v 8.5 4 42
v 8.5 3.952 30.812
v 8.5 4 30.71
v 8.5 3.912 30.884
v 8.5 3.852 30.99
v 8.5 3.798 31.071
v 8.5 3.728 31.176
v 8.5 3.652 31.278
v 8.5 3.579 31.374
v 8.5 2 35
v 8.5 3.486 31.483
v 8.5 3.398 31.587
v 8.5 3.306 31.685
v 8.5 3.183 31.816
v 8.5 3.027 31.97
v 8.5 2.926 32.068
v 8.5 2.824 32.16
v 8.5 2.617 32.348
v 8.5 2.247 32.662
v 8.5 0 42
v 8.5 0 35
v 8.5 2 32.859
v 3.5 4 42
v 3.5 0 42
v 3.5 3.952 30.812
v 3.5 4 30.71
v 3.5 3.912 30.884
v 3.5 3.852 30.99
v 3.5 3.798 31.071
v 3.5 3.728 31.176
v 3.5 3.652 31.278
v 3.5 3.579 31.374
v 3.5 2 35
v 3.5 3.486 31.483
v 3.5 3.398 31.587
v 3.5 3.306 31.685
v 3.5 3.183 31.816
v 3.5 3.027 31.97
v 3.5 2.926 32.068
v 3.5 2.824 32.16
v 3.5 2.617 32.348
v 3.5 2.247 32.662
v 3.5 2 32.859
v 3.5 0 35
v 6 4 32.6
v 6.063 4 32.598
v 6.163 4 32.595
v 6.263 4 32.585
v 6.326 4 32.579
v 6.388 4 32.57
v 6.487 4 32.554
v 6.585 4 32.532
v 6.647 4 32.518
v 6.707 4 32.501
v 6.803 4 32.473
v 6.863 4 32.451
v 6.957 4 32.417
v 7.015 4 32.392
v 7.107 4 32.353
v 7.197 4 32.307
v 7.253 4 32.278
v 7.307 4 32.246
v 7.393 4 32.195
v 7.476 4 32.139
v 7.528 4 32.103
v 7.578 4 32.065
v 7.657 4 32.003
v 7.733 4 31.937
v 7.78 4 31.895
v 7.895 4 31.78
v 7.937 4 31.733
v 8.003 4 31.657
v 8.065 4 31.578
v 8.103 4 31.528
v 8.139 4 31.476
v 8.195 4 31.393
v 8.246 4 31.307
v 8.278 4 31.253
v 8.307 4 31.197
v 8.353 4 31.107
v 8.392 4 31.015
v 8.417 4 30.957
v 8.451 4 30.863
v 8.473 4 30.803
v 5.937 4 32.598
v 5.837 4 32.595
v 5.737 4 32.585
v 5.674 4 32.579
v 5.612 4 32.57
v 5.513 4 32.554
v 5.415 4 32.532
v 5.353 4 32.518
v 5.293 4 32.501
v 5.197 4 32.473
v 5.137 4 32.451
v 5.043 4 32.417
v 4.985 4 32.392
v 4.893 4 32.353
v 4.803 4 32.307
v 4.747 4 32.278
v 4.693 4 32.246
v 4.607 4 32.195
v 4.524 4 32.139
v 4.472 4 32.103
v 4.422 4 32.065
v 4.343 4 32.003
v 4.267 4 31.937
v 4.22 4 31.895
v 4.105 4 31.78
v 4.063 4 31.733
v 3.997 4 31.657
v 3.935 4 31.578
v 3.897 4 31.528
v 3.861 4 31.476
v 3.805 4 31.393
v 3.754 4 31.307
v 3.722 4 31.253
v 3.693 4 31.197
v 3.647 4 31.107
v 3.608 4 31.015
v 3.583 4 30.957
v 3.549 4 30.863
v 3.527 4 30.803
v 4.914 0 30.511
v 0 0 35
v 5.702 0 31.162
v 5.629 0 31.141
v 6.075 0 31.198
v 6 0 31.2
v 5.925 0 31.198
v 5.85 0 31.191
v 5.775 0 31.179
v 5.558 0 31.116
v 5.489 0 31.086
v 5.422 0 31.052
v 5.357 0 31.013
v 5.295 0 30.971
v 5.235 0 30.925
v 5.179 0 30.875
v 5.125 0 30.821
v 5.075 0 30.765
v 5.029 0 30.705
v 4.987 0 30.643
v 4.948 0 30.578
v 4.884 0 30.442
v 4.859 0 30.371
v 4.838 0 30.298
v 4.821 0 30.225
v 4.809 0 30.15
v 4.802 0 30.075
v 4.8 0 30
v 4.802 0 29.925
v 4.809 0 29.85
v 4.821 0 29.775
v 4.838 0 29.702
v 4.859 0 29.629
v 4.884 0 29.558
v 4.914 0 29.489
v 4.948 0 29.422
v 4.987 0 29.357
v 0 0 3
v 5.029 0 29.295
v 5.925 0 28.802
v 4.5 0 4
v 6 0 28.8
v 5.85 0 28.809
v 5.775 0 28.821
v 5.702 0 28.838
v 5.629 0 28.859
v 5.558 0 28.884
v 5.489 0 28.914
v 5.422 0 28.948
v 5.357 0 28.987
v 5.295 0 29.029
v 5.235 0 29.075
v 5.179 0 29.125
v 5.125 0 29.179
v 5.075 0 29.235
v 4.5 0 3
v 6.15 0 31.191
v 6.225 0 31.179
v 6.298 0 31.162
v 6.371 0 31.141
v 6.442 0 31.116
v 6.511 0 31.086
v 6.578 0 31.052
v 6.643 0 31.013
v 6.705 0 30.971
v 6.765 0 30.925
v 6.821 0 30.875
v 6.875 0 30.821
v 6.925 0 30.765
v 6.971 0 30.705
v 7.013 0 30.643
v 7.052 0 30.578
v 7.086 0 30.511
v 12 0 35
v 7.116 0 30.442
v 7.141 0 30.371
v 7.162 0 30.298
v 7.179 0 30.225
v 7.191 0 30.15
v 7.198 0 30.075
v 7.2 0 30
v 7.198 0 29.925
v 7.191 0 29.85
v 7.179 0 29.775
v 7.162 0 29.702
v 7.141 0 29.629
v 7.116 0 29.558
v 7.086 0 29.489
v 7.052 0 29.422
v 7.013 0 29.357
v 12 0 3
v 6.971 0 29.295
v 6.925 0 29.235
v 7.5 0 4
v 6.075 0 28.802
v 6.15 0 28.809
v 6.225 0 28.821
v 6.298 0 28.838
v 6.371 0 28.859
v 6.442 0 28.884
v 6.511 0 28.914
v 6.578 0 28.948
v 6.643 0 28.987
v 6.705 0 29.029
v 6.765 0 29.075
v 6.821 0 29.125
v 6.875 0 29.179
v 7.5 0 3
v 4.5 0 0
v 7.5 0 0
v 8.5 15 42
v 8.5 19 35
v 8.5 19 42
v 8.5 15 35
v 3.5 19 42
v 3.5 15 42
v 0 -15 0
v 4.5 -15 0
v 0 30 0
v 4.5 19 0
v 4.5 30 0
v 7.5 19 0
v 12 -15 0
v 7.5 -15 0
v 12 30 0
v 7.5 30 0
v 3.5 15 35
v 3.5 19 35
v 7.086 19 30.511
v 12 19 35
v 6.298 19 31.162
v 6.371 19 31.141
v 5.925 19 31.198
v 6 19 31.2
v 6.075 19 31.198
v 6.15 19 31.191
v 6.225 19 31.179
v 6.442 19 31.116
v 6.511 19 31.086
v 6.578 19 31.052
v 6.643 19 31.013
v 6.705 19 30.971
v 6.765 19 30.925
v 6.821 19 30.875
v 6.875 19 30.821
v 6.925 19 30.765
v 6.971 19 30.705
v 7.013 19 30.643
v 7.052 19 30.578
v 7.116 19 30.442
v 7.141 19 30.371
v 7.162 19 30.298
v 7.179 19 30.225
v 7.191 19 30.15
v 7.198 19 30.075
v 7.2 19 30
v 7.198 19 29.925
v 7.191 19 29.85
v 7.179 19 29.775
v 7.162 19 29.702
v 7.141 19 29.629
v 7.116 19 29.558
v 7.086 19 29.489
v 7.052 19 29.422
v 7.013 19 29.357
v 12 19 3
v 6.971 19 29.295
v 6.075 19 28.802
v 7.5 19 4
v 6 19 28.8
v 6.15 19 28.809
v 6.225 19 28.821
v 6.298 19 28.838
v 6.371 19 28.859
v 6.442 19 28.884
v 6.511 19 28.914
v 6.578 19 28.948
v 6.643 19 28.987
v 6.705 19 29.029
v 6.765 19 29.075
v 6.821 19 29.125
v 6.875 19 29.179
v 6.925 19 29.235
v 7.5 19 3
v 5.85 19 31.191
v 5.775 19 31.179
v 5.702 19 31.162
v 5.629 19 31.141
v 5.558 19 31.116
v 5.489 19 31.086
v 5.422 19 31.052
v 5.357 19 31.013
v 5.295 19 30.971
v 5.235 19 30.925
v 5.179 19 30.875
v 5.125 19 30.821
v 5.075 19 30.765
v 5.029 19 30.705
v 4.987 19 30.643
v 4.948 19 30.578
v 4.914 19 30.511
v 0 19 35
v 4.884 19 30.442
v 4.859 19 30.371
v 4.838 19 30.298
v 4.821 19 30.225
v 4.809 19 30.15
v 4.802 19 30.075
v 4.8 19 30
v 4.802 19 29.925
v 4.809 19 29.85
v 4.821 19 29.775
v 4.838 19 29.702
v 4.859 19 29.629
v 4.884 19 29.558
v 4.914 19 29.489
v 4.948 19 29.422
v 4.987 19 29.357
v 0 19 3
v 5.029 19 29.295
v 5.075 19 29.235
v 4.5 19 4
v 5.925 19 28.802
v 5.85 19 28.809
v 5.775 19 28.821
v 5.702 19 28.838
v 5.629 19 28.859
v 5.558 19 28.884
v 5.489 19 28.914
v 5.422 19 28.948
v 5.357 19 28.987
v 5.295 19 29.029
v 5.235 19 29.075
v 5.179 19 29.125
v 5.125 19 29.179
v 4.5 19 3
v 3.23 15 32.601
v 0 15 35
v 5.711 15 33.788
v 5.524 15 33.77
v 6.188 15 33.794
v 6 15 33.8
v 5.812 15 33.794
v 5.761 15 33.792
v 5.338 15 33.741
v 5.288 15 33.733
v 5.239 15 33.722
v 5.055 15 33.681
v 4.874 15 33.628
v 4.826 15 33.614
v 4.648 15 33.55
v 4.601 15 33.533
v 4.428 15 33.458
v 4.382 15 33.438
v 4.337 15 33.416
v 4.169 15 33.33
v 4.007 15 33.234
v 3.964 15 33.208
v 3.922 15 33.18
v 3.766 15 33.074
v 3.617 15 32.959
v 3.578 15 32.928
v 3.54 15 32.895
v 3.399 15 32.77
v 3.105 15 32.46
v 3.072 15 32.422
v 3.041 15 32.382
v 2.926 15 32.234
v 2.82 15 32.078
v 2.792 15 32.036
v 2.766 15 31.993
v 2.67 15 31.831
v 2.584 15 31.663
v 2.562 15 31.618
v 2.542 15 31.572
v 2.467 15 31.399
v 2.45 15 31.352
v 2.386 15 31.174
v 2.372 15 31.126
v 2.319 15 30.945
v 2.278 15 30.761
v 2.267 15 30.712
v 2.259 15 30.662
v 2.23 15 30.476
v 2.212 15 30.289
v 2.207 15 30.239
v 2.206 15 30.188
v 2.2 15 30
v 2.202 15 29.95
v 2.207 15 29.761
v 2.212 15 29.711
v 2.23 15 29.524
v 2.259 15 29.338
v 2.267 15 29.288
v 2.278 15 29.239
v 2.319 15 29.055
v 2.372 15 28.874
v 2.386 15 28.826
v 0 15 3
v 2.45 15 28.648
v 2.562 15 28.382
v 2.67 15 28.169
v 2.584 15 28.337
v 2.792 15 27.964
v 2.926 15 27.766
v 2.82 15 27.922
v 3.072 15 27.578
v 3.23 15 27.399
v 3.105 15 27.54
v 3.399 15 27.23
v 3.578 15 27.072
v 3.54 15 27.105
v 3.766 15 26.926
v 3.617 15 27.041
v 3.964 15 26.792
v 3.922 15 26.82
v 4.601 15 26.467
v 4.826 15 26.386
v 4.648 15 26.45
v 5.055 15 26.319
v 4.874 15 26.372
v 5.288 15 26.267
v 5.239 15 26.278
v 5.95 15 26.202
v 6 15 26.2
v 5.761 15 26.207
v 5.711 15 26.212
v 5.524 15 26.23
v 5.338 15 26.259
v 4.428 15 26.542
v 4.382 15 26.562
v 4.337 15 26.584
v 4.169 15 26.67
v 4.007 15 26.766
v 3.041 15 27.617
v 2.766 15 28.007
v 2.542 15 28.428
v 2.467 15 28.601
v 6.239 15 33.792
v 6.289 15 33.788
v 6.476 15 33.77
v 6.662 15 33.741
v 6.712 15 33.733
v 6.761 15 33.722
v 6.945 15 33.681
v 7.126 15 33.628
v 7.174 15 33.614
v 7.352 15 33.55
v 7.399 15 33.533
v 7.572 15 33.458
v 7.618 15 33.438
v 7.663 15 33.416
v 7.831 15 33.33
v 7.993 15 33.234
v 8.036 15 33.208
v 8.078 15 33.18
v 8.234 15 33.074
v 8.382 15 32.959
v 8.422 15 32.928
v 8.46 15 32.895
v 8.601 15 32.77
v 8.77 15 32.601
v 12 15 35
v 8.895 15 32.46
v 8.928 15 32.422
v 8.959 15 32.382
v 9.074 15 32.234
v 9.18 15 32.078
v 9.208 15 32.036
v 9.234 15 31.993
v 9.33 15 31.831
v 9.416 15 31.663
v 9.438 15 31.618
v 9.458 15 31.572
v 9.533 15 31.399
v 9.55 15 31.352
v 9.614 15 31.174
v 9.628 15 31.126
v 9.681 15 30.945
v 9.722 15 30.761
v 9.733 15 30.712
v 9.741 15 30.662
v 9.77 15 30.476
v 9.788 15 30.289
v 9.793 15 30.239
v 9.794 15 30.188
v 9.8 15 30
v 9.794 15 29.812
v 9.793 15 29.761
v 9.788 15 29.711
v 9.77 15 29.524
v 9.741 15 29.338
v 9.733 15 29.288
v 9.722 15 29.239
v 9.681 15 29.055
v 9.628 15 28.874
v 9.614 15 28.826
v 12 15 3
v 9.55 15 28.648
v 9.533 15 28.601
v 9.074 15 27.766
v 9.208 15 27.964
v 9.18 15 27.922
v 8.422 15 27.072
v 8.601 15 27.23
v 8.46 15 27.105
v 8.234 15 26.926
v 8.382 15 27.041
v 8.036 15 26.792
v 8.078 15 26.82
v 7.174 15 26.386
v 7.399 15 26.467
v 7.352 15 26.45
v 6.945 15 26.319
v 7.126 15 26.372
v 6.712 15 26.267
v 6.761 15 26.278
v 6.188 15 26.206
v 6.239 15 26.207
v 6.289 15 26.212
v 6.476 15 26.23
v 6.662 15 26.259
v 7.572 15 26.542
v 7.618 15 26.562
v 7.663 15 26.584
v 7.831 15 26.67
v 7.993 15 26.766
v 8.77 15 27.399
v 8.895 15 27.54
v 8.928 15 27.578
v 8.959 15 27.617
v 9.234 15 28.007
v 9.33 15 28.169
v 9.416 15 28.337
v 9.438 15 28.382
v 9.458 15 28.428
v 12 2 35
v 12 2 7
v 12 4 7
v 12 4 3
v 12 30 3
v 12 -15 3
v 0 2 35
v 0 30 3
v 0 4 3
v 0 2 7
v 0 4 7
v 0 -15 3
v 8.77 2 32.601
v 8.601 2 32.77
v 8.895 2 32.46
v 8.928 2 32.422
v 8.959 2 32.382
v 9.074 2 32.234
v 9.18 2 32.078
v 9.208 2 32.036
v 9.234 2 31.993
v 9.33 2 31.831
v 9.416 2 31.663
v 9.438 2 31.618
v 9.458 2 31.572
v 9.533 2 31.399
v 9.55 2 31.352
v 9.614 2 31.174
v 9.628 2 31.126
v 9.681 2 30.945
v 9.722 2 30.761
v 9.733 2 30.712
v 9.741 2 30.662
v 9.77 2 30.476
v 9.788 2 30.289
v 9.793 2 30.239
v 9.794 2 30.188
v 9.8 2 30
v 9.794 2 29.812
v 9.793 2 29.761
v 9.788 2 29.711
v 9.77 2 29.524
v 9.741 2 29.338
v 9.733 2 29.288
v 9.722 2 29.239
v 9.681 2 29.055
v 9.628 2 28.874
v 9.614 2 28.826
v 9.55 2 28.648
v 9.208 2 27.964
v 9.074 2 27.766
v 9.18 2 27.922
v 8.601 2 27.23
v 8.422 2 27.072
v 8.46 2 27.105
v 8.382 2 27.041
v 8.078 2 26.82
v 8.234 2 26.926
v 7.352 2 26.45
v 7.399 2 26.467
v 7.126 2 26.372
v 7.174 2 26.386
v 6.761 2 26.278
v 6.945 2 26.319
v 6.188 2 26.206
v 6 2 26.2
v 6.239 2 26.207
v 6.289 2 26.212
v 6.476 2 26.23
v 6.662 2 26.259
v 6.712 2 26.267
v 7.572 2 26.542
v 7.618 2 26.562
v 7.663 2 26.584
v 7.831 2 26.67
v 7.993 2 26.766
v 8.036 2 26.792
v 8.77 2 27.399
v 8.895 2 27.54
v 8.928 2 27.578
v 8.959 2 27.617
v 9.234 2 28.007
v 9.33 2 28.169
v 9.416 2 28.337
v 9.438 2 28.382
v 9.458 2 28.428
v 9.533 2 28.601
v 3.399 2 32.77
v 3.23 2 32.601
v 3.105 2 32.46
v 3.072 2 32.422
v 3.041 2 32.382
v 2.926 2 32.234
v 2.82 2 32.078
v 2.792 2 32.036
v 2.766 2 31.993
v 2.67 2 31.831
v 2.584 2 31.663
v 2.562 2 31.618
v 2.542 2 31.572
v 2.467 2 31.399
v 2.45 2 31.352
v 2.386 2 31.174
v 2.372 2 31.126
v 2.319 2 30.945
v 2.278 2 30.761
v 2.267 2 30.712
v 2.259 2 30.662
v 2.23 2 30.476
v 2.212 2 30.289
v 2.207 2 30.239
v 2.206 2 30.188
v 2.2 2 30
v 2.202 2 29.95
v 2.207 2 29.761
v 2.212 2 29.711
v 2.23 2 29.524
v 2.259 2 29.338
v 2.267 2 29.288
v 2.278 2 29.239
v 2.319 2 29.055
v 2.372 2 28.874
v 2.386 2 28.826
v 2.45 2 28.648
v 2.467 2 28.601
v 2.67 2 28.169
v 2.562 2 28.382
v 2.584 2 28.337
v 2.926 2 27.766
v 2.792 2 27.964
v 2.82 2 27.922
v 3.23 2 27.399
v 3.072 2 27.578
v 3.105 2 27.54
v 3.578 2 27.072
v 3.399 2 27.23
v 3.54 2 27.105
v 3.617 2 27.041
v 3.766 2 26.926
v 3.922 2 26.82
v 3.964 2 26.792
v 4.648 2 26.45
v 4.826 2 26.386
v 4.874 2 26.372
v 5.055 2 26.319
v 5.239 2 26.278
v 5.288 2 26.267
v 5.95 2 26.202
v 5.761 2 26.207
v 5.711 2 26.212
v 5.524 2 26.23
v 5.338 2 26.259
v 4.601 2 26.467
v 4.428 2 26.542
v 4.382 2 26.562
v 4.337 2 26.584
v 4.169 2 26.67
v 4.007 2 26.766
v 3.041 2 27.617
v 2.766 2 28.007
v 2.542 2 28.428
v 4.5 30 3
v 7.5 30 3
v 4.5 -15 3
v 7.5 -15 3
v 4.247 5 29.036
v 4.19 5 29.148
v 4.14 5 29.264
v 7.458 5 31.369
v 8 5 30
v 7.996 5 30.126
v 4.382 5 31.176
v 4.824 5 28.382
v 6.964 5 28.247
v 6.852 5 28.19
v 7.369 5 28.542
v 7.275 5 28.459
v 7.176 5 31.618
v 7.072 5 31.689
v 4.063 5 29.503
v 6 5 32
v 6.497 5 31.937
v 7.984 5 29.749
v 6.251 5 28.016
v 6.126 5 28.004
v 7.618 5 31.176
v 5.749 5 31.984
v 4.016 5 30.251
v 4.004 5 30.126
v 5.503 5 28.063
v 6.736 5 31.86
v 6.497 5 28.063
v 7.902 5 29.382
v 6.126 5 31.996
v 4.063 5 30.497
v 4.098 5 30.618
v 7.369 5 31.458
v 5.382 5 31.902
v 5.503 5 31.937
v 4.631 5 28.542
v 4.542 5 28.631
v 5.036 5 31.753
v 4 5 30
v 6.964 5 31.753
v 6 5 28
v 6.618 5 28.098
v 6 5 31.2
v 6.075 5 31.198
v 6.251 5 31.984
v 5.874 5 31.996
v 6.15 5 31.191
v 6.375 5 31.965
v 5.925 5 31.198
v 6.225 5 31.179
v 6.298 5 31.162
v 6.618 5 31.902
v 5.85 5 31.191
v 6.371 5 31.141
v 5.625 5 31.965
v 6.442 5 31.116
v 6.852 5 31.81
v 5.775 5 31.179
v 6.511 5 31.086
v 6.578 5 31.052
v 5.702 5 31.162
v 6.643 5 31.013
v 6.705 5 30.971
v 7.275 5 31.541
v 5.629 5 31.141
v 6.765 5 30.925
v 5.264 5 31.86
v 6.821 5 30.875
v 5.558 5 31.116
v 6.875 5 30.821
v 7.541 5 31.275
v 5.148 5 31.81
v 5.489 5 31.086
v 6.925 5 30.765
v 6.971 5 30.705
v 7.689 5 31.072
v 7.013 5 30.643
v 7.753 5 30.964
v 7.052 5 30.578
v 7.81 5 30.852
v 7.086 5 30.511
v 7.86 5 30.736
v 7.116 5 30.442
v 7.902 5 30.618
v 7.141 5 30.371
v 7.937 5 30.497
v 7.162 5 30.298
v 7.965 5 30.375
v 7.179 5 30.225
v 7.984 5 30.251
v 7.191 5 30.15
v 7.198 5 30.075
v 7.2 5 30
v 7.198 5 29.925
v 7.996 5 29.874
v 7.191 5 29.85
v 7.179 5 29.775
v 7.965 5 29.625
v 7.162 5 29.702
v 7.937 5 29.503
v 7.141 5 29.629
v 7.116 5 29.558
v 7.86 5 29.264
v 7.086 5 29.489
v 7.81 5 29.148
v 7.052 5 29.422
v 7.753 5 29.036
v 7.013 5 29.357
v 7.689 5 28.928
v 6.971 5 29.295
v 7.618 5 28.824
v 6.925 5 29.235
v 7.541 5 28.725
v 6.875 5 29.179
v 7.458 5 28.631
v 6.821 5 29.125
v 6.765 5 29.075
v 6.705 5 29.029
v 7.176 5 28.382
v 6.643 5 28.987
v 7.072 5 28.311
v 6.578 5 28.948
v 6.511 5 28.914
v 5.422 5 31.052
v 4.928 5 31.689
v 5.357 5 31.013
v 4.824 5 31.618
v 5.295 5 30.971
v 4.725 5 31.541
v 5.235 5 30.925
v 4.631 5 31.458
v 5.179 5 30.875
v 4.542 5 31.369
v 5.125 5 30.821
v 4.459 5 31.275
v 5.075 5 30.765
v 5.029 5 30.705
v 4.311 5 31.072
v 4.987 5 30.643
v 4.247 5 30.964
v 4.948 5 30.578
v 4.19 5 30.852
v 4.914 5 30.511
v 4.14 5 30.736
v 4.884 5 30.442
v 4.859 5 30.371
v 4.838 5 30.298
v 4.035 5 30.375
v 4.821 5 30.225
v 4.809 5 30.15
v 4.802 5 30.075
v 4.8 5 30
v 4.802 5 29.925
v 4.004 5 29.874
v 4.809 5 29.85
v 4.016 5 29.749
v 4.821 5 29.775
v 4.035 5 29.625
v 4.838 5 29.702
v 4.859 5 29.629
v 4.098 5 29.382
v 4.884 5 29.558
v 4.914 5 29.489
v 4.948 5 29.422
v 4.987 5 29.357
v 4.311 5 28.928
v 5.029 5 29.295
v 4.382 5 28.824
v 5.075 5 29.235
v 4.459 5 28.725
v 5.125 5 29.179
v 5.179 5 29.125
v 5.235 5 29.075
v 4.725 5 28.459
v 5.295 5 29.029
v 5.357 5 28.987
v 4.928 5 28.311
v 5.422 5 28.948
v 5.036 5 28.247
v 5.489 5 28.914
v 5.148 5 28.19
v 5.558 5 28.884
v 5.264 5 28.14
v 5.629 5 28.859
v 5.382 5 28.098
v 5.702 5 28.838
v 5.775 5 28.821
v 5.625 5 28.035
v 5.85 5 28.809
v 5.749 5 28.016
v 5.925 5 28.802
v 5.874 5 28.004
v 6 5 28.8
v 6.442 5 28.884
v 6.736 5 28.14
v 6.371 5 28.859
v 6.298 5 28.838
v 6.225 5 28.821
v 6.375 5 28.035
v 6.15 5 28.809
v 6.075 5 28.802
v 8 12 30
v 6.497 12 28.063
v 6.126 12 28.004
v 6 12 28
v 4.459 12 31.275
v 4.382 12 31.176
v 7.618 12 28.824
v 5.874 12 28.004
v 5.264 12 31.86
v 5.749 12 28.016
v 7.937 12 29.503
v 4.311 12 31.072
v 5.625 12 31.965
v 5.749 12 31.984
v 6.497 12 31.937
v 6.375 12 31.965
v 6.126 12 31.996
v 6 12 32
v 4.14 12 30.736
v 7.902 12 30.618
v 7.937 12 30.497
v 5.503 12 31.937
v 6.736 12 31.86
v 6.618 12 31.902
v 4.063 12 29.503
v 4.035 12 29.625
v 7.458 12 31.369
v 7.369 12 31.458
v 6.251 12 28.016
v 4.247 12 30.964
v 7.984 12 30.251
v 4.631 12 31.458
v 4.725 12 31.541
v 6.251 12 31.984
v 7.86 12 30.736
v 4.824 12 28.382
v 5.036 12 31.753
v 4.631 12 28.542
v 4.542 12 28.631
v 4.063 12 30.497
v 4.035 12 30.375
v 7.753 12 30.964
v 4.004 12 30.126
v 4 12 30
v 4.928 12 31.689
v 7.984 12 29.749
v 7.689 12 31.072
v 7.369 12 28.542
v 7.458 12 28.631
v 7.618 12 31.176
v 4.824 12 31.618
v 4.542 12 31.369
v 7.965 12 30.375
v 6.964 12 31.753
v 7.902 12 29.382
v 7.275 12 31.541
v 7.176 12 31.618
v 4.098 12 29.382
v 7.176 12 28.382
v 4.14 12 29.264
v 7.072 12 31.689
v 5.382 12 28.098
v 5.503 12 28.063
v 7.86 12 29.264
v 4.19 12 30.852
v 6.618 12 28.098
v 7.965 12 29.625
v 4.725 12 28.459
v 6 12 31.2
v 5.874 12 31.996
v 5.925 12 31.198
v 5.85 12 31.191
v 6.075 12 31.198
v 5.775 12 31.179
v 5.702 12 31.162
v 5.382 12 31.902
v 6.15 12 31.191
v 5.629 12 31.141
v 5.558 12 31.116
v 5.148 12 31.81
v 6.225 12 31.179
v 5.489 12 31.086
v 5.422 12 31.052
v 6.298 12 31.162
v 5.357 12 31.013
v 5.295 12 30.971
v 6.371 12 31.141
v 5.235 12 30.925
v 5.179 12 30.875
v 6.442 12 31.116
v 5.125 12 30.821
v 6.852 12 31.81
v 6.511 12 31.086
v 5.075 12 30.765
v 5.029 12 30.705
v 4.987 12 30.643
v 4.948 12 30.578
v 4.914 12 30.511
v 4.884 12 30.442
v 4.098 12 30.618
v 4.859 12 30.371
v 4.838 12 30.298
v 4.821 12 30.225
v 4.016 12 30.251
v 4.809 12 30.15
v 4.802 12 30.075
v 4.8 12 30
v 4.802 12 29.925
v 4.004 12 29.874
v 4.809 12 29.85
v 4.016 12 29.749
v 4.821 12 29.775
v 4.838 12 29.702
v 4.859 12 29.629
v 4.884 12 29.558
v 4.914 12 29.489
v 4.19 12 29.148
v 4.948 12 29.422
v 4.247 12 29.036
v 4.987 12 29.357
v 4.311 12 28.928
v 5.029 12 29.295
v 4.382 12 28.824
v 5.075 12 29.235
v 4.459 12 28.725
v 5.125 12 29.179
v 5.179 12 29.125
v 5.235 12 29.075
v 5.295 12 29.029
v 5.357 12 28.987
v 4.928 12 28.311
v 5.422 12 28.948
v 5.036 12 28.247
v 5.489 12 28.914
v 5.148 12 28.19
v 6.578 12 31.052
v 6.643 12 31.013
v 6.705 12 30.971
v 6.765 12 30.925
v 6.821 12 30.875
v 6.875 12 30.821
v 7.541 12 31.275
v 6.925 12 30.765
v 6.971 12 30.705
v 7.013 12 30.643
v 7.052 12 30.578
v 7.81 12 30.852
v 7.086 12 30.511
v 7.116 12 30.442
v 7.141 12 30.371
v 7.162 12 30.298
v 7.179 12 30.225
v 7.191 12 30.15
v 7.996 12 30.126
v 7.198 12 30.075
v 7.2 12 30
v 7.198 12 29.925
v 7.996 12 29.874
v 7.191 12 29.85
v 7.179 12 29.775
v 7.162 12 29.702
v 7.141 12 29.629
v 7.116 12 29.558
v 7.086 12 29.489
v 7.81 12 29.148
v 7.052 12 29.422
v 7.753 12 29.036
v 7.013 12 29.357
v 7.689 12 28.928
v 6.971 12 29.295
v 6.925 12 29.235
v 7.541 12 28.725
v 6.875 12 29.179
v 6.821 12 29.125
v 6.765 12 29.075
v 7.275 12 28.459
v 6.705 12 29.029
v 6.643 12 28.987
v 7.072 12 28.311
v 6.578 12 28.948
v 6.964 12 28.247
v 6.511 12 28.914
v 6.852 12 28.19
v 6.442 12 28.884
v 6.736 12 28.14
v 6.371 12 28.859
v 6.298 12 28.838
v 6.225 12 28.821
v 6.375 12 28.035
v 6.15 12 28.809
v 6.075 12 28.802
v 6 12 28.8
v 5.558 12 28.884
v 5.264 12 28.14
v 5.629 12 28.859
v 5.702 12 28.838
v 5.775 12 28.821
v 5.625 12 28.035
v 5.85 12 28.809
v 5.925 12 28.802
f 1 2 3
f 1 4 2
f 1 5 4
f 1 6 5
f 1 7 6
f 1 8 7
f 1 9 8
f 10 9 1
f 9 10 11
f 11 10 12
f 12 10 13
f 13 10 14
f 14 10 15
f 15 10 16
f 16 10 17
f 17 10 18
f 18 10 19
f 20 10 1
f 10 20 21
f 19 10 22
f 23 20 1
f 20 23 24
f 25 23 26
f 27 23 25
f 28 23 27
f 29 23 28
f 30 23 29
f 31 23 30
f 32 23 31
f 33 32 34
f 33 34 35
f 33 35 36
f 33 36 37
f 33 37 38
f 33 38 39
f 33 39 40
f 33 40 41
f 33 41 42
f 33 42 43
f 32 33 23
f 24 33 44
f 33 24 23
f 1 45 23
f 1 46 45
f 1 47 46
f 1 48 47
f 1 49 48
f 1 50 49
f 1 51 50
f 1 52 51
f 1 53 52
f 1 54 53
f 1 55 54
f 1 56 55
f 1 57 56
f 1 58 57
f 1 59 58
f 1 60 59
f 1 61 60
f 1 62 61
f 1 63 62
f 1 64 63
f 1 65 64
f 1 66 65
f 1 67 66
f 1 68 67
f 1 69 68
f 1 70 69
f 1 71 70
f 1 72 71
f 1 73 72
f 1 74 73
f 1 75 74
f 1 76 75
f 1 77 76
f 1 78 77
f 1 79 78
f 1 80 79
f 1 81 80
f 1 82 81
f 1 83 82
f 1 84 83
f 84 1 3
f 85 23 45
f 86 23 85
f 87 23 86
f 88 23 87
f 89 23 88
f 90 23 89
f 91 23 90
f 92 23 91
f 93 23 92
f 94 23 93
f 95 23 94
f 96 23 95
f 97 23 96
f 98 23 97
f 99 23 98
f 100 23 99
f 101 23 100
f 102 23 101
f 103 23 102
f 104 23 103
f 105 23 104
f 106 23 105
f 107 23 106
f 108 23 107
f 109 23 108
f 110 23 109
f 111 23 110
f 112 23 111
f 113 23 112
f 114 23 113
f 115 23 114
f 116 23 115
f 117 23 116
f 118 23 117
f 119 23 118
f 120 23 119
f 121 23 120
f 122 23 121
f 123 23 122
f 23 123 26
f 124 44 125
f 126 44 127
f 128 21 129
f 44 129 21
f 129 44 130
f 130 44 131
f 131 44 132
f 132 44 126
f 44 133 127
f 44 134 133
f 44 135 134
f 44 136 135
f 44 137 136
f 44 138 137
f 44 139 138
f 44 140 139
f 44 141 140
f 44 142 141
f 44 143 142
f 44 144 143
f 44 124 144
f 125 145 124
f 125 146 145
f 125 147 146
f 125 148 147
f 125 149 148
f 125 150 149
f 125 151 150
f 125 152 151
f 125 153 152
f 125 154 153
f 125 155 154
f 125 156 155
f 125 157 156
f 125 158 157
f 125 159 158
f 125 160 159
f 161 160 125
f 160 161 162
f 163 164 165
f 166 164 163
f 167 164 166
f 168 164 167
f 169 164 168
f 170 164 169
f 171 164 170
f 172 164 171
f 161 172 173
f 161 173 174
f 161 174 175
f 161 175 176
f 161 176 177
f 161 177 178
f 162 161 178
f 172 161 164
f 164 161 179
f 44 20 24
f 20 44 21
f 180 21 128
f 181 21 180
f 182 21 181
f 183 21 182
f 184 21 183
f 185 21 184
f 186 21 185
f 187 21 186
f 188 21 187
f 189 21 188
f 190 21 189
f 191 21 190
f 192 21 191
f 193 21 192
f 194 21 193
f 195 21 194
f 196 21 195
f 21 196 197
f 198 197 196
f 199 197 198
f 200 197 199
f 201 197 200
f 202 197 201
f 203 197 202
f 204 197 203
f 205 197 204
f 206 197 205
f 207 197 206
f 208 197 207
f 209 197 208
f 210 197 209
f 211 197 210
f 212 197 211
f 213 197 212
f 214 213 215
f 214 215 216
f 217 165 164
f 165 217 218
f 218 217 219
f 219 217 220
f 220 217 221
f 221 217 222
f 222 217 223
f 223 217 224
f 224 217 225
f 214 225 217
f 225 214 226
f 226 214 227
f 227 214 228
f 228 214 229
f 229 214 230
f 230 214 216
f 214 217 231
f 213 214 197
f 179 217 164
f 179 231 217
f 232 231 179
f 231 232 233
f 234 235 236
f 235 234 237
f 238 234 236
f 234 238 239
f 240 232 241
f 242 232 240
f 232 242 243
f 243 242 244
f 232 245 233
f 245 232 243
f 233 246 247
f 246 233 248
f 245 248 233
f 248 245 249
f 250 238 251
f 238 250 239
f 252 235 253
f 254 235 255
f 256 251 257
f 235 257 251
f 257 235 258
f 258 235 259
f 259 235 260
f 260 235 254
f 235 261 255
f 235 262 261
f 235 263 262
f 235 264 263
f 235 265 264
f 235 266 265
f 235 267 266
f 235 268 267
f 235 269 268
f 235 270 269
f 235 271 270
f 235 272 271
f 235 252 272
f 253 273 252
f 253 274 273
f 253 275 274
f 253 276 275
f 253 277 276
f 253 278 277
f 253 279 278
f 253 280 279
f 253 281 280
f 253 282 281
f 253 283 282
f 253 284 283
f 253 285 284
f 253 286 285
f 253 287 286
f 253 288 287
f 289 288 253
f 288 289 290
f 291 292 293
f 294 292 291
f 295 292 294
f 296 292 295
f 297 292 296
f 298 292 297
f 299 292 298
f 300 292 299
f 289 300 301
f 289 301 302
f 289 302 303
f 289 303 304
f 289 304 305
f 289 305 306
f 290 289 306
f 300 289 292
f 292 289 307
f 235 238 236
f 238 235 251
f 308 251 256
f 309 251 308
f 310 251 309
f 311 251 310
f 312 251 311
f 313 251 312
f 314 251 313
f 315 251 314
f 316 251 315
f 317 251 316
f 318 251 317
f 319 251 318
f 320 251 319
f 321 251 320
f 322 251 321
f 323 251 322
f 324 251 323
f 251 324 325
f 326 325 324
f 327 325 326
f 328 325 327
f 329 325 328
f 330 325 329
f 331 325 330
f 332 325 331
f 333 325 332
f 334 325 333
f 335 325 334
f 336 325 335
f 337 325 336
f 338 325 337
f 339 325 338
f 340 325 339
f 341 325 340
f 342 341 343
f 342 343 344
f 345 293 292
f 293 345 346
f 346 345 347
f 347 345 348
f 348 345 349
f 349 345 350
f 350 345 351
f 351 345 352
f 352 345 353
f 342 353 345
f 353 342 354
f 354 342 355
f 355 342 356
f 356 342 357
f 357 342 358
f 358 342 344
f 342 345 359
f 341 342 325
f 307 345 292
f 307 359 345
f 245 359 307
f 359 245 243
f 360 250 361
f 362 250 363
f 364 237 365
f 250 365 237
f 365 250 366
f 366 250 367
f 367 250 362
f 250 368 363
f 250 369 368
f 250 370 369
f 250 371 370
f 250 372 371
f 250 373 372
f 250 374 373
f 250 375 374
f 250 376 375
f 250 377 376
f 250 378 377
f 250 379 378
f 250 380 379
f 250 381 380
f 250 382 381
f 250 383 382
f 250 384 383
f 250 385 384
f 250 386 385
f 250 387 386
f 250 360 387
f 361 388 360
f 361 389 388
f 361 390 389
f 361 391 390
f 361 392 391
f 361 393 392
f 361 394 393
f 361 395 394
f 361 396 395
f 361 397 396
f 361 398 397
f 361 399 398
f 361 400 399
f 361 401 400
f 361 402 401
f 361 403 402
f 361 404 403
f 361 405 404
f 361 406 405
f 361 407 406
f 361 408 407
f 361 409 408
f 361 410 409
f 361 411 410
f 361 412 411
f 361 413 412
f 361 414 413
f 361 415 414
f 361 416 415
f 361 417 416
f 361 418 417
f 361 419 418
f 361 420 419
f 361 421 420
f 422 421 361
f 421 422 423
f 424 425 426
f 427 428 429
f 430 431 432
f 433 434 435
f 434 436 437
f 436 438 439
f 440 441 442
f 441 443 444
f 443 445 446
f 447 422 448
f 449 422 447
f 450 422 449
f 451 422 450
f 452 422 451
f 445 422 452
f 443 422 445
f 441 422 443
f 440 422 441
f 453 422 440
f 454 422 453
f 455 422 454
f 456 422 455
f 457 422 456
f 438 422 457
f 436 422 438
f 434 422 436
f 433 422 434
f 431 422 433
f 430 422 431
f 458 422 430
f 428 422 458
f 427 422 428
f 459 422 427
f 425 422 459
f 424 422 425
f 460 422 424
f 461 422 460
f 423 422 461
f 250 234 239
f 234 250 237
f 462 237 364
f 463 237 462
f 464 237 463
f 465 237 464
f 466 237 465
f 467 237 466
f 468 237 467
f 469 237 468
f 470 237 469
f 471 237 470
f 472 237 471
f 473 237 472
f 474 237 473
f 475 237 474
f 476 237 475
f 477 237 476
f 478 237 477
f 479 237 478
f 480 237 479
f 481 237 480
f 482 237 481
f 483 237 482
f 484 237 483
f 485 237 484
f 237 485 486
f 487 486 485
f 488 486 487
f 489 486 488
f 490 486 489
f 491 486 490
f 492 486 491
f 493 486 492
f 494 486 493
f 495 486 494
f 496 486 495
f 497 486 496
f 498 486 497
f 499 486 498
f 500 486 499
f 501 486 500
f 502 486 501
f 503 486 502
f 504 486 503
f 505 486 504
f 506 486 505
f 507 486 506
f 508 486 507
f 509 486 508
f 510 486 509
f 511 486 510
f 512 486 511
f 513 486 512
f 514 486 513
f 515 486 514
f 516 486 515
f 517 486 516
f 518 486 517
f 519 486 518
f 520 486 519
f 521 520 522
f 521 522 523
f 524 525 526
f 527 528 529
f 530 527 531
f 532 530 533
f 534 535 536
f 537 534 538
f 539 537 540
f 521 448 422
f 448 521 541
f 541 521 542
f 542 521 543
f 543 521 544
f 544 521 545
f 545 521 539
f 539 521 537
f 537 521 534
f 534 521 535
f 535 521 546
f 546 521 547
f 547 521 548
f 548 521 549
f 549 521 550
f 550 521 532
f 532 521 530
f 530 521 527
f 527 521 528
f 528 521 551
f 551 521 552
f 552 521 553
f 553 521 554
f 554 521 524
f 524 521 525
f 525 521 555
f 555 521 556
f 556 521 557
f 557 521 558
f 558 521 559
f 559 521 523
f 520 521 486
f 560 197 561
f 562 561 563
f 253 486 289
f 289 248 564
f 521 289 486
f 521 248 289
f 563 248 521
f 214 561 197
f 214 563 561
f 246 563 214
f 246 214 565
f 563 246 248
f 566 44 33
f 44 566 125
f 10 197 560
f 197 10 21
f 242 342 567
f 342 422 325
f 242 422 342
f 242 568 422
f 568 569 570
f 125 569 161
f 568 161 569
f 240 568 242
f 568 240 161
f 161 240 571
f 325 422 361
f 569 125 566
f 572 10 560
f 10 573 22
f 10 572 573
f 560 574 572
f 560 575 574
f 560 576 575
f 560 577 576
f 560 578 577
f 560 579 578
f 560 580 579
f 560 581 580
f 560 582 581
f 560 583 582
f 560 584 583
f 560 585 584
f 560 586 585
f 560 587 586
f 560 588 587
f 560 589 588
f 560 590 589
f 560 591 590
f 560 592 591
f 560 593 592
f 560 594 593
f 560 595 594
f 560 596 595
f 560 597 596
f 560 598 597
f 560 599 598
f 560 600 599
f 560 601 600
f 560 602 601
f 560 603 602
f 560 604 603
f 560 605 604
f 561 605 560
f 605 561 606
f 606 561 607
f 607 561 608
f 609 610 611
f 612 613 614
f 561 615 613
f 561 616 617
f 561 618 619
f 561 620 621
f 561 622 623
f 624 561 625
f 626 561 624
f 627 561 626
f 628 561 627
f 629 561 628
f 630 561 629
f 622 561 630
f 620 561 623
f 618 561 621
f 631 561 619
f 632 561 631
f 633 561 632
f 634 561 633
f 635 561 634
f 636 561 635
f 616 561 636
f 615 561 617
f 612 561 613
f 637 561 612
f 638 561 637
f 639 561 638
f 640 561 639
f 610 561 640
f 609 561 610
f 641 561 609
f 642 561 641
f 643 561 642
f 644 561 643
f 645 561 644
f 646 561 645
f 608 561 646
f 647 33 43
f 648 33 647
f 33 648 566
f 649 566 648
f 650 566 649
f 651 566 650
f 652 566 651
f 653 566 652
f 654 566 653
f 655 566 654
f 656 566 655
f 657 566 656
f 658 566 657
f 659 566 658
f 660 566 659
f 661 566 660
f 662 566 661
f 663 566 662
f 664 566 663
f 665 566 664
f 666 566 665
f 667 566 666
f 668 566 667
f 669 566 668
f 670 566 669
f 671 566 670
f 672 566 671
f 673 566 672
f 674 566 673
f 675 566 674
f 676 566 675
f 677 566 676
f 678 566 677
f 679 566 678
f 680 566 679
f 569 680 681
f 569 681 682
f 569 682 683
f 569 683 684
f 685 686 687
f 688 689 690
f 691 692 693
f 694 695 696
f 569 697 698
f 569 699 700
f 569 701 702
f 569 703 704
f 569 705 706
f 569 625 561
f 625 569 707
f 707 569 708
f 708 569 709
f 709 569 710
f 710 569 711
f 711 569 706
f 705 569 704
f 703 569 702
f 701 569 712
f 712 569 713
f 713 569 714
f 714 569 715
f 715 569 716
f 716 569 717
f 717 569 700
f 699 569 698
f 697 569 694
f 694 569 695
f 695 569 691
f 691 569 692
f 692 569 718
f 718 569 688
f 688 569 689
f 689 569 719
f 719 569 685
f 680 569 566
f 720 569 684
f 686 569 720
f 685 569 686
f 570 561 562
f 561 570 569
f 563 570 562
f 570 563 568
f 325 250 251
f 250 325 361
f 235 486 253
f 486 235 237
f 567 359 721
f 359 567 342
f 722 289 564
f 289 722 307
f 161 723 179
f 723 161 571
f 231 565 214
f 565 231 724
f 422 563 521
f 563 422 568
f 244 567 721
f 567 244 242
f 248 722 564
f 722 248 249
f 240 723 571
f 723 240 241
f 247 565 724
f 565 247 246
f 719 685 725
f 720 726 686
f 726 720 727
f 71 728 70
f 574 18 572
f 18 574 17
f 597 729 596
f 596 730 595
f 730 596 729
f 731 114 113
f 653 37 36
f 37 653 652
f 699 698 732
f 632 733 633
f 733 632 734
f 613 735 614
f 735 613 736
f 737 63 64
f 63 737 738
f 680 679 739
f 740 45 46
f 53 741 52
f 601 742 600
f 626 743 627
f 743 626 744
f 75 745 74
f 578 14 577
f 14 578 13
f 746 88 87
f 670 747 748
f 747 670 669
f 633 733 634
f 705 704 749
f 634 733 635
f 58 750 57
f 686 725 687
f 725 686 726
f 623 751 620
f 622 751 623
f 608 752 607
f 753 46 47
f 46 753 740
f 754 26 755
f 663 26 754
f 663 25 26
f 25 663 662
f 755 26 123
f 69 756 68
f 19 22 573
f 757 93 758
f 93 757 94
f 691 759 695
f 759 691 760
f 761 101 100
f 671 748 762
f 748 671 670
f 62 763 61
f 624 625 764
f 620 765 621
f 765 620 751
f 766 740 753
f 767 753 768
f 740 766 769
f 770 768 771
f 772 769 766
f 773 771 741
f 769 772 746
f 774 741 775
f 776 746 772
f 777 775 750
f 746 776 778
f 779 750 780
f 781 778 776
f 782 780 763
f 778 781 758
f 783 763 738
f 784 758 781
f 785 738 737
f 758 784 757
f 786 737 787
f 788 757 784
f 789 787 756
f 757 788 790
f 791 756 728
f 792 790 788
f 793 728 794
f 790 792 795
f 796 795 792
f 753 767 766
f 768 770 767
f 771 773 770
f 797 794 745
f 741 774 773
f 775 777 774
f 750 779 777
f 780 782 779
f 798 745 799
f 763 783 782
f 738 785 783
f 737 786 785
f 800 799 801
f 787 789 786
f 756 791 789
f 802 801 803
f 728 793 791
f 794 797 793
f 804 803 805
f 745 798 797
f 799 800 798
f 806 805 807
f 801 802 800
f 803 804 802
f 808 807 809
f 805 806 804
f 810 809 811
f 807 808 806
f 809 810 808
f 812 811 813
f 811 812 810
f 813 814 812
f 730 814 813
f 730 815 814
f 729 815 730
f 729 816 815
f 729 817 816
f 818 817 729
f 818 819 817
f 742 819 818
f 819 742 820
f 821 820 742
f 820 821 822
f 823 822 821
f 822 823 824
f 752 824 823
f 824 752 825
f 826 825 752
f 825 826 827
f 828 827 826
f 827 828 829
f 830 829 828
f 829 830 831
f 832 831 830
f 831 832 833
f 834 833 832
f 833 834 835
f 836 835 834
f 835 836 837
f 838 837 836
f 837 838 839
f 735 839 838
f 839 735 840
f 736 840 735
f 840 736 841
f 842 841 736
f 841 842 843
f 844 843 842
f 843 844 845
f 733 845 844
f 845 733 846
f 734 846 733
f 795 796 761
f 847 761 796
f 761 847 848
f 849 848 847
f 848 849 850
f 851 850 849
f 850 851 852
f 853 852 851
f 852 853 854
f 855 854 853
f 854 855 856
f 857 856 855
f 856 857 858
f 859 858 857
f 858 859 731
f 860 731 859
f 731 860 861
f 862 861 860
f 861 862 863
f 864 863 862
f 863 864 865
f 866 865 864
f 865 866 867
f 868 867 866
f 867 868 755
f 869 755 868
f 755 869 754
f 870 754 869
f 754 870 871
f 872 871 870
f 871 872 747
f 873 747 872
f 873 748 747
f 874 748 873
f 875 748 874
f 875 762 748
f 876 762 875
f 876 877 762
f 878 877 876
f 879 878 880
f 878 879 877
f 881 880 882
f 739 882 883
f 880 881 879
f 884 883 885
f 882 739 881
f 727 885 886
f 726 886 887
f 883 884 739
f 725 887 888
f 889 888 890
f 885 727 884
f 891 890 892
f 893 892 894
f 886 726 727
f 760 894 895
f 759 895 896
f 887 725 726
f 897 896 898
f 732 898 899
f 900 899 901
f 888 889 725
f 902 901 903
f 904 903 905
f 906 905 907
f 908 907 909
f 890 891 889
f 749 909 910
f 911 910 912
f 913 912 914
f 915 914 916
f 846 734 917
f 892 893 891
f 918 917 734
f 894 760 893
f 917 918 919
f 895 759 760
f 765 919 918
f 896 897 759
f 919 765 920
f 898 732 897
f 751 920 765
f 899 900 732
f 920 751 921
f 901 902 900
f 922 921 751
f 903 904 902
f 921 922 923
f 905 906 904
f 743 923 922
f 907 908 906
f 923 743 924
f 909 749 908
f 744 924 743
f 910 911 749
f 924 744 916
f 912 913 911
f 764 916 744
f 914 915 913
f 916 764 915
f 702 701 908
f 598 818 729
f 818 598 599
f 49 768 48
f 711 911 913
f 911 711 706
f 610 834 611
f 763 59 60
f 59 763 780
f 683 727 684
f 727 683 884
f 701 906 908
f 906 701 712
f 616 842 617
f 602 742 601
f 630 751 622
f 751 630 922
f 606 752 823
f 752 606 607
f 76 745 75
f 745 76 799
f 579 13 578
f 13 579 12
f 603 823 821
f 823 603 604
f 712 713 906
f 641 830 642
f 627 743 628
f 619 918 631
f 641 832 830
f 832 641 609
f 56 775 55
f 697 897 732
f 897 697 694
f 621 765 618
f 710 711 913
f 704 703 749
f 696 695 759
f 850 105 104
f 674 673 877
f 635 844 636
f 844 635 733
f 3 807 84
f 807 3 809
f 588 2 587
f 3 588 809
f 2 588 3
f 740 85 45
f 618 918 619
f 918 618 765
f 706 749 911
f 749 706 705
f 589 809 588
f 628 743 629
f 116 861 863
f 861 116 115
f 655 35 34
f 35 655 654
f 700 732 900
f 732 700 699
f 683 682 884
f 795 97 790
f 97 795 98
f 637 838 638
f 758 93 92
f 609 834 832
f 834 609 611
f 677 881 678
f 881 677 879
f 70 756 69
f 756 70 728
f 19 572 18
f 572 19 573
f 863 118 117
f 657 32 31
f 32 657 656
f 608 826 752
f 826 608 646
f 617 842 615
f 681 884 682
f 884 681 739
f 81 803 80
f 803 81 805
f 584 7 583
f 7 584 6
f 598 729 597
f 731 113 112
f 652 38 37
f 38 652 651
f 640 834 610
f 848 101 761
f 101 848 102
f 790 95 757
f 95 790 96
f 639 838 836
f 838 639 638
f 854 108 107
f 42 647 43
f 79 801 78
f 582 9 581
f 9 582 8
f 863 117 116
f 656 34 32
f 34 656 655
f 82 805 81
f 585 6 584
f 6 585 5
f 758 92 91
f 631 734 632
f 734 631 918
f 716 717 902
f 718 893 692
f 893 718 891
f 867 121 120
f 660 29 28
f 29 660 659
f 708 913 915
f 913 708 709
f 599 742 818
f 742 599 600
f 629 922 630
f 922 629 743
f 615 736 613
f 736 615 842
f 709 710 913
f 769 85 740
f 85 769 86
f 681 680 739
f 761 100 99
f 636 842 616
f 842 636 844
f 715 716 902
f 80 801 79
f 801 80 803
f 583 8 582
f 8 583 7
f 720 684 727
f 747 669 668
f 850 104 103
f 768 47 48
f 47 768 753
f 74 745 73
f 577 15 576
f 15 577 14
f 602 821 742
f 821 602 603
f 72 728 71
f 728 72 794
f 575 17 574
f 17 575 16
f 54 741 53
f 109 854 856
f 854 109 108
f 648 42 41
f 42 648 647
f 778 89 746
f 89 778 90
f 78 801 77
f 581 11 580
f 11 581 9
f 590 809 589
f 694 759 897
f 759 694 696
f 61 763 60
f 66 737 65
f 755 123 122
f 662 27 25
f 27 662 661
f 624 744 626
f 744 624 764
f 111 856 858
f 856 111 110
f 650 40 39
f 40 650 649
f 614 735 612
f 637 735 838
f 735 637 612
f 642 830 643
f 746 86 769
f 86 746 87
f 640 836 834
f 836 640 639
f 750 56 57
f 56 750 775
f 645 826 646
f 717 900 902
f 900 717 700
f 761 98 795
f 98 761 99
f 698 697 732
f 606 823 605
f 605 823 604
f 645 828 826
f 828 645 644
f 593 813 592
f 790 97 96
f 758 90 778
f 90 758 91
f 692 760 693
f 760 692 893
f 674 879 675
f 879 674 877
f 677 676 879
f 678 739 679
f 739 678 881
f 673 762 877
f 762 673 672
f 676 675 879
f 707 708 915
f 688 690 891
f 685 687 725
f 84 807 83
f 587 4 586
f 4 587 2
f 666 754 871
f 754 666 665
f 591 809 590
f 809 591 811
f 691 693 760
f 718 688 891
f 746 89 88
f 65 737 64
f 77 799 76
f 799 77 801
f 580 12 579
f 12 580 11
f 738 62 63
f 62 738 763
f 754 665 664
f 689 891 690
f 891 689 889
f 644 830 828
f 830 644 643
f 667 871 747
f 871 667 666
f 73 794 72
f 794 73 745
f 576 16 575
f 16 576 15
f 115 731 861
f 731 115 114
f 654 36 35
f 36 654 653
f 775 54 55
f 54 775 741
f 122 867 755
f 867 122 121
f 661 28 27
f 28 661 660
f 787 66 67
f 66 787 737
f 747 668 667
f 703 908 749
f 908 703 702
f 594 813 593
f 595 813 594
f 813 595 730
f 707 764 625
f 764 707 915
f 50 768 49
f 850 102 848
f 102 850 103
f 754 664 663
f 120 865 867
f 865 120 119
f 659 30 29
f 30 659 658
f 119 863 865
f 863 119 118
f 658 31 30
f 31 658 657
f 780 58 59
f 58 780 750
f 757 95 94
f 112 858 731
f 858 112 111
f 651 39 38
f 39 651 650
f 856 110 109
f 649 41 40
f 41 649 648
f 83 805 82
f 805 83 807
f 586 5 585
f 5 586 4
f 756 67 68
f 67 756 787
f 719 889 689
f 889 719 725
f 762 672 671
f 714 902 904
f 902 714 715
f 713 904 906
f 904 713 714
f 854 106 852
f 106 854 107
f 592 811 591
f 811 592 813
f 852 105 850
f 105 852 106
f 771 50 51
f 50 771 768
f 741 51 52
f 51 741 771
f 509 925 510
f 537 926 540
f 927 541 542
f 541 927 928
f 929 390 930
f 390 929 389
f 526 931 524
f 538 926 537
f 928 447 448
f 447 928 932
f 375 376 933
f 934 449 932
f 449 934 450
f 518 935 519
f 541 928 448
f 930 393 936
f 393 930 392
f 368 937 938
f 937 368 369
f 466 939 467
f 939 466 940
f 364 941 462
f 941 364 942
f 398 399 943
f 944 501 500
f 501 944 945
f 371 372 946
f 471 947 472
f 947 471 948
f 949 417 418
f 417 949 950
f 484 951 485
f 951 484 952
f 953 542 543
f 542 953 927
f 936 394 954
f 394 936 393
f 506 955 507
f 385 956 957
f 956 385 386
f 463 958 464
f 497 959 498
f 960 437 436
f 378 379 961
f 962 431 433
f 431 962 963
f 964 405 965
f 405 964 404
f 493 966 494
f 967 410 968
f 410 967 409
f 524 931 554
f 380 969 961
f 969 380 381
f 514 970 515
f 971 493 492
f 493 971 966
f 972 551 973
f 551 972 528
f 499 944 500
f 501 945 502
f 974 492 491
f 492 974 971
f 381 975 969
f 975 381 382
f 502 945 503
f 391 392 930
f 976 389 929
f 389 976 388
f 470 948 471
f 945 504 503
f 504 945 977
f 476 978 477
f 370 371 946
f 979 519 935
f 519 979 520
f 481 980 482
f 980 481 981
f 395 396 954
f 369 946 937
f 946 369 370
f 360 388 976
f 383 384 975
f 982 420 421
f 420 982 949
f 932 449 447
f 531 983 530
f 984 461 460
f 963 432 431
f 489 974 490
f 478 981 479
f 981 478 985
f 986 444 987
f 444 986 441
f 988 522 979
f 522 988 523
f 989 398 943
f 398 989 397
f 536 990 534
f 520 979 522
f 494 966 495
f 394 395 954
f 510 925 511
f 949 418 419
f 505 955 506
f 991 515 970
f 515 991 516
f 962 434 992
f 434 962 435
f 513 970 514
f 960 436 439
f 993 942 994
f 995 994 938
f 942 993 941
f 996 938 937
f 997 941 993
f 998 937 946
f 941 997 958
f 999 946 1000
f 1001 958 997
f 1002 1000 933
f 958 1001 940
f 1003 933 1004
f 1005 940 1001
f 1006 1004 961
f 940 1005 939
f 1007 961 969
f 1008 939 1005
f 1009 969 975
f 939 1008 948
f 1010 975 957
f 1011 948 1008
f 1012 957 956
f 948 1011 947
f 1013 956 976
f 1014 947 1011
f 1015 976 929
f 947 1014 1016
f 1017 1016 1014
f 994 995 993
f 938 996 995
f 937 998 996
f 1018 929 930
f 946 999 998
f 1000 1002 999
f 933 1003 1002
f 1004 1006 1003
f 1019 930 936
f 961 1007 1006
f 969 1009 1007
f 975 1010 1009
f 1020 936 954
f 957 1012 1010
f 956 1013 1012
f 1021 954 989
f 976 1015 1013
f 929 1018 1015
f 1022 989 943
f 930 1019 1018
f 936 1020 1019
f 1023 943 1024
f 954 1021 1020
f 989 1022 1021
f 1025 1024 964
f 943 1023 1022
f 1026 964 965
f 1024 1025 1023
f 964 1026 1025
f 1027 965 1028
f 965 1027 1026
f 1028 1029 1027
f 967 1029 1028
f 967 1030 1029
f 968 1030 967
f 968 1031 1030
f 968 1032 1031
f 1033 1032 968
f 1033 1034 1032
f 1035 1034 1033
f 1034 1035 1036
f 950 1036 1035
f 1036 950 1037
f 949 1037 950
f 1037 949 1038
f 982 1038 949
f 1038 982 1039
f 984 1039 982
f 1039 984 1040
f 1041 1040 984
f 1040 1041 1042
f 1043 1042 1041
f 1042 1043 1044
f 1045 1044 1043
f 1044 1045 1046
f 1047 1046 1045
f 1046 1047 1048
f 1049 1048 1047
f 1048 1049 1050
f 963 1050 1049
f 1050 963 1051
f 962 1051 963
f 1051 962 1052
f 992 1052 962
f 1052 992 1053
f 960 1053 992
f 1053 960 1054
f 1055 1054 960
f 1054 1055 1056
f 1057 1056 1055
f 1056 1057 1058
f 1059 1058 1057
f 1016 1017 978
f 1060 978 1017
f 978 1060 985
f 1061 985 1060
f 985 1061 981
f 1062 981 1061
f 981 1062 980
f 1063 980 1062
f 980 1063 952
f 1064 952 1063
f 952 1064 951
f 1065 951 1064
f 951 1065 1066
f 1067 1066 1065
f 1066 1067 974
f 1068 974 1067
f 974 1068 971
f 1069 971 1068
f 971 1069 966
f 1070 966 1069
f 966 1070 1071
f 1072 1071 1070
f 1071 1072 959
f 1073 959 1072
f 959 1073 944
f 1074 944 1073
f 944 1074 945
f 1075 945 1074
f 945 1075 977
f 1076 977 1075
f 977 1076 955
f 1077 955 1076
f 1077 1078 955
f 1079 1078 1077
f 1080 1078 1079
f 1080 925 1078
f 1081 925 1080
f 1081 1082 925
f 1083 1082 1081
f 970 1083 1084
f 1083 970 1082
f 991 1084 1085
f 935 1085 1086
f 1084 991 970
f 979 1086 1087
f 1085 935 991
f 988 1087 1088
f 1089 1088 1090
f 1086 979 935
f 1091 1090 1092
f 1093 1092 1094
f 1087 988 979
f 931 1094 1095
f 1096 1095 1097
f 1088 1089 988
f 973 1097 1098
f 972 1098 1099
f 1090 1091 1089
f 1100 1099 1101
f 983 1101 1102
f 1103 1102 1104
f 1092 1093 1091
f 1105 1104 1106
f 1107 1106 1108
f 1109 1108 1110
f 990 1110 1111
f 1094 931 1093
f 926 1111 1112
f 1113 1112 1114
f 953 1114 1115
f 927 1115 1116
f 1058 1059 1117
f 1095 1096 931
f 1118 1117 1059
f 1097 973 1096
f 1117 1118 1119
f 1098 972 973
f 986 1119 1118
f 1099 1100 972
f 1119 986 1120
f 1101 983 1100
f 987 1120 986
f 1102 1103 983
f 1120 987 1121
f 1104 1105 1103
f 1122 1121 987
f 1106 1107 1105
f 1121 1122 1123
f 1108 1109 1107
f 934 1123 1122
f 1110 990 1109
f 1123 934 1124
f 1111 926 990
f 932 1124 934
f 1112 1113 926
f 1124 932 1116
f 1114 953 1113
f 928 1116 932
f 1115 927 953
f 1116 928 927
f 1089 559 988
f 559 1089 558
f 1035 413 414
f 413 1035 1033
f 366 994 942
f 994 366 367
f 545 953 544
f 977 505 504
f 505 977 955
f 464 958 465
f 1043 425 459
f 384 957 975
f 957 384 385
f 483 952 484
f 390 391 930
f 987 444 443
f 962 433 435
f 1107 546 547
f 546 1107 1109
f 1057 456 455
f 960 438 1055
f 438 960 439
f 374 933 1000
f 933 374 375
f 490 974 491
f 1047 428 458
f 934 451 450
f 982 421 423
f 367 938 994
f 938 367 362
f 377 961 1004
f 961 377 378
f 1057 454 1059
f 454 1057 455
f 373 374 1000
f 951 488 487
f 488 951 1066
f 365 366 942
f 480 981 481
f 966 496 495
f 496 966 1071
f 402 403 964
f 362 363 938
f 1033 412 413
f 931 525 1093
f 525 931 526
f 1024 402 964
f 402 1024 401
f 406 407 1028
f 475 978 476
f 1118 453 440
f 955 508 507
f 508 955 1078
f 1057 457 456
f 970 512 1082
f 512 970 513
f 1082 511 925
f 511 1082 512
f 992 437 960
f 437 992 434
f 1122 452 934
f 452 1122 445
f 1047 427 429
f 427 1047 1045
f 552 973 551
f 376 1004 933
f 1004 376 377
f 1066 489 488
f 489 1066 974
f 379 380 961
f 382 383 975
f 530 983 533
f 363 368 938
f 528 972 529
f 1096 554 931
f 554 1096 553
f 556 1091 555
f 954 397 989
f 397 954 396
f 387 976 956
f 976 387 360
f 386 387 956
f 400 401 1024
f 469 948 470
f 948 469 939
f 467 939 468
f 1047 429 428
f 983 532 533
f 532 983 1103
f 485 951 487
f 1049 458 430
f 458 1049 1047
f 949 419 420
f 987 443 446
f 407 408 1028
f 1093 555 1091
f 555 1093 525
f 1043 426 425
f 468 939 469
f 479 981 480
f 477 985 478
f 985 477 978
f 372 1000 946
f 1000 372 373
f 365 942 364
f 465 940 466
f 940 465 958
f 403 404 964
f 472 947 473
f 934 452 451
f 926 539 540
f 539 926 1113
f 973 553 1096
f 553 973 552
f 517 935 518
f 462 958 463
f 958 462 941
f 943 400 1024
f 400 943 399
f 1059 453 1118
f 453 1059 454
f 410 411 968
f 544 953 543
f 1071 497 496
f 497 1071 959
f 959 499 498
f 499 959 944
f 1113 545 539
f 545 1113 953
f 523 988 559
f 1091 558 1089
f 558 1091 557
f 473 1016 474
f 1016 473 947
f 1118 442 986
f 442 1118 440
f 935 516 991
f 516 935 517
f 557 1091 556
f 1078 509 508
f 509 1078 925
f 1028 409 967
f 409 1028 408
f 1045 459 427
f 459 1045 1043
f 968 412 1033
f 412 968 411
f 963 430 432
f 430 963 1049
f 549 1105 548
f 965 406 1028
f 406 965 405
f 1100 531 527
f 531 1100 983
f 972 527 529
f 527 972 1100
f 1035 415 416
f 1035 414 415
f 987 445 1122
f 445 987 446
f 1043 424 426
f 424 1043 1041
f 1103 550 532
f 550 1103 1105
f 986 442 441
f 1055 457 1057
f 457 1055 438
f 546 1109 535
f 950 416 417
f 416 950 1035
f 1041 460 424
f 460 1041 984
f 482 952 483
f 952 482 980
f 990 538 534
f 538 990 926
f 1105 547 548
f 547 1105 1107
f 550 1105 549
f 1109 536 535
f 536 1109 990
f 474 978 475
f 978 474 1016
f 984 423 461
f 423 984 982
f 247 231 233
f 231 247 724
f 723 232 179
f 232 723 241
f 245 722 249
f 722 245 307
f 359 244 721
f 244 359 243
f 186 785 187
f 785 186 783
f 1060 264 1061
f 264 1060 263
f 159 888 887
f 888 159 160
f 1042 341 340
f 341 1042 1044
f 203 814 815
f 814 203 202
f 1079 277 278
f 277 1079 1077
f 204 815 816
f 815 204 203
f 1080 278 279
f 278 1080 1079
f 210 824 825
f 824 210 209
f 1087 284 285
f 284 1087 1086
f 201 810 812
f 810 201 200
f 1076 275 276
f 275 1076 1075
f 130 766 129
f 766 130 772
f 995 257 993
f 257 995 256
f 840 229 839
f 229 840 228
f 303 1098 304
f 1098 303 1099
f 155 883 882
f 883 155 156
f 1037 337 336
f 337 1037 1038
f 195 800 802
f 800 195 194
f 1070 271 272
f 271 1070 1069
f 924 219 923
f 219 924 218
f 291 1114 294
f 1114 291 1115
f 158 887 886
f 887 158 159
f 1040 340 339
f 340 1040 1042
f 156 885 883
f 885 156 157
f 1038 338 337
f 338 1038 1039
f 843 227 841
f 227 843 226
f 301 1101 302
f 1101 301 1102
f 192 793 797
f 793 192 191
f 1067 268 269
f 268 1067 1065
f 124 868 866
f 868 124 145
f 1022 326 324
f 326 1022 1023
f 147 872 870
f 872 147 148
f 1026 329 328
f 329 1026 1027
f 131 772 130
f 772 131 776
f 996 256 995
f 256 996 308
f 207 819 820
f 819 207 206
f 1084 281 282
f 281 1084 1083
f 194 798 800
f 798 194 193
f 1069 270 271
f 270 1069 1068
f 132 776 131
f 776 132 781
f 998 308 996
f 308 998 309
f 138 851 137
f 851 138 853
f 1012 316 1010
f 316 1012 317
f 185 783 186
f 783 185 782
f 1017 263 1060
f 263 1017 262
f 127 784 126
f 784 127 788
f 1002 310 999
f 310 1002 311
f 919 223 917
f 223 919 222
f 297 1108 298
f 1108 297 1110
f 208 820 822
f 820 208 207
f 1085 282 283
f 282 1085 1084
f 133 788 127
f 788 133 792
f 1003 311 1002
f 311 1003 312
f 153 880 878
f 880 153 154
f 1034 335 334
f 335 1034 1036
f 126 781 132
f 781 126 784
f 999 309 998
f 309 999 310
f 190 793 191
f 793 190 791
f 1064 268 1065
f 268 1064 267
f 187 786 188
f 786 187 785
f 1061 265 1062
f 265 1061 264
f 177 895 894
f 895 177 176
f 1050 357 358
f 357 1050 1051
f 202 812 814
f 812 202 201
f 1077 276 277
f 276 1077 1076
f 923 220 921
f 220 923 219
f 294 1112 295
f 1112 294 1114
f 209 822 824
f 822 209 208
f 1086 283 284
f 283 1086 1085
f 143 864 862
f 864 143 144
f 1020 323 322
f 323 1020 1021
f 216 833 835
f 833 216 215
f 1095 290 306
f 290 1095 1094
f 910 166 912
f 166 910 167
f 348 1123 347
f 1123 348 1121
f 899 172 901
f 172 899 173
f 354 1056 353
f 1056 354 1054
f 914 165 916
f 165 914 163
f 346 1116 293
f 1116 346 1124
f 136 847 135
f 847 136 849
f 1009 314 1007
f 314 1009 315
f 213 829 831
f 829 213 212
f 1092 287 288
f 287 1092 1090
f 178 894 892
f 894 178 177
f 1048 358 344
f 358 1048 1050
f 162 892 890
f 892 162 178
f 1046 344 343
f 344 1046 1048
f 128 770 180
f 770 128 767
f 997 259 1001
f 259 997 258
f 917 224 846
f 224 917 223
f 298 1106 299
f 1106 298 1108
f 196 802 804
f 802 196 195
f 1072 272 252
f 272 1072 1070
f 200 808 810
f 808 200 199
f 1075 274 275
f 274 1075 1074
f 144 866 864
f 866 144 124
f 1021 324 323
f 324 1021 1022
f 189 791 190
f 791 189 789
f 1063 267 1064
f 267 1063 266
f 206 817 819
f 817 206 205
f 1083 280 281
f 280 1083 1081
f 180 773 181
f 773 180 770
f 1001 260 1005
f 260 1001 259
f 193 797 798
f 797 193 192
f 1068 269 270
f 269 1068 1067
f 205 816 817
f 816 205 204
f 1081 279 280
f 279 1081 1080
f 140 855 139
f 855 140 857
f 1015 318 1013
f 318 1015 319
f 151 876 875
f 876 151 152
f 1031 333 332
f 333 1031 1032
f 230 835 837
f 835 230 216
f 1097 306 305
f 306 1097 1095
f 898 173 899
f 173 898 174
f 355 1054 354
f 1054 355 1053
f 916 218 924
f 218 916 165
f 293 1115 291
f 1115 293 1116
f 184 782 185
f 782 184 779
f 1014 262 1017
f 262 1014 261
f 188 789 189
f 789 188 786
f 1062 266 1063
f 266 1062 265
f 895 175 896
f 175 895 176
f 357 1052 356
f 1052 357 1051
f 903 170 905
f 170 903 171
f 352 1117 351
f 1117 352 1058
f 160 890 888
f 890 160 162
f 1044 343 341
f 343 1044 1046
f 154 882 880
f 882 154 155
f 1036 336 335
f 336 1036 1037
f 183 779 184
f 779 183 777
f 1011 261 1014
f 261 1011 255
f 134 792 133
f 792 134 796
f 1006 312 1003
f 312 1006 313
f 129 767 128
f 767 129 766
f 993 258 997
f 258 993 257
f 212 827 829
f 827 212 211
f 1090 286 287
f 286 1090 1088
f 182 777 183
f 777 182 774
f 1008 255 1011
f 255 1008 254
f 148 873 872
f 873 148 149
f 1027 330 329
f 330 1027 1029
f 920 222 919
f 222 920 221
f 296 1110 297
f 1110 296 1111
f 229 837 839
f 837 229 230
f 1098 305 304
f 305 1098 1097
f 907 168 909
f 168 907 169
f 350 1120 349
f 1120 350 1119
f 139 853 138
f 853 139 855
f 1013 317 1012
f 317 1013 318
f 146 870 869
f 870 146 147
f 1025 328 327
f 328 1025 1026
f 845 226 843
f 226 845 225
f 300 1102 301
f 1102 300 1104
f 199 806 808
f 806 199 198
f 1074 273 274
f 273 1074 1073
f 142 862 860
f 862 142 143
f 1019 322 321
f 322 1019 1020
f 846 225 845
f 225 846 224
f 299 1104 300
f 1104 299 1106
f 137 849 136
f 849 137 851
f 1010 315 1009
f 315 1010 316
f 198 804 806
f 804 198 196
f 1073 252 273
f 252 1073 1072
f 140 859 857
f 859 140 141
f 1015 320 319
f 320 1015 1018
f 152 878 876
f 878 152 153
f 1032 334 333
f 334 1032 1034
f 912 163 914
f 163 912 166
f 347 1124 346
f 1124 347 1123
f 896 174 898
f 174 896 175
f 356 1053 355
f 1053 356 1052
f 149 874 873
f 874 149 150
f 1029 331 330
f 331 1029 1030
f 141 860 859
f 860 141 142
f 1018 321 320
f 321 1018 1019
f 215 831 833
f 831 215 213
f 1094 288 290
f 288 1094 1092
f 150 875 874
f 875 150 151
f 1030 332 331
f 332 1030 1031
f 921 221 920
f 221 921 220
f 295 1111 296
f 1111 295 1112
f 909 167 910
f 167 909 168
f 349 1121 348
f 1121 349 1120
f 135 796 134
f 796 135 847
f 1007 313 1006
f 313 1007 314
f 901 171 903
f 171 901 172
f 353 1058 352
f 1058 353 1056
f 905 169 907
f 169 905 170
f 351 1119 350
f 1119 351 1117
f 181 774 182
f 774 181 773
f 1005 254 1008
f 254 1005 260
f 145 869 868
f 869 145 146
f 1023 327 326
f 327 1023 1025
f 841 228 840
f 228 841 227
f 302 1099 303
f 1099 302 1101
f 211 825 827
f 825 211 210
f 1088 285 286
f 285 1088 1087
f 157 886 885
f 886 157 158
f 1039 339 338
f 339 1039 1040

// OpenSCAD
        difference(){
            union(){

                translate([3.5,0,30]){
                    cube([5,4,12], center=false);
                }      


                translate([3.5,15,0]){
                    cube([5,4,42], center=false);
                }      


                translate([0,0,0]){
                    cube([12,2,35], center=false);
                }      
                translate([0,0,0]){
                    cube([12,4,7], center=false);
                }      


                translate([0,15,0]){
                    cube([12,4,35], center=false);
                }      



                translate([0,-15,0]){
                    cube([12,45,3], center=false);
                }      

                translate([6,5,30]){
                    rotate([90,0,0]){
                        cylinder(h=5, r1=2, r2=5, $fn=100, center=false);
                    }
                }  

                translate([6,17,30]){
                    rotate([90,0,0]){
                        cylinder(h=5, r2=2, r1=5, $fn=100, center=false);
                    }
                }  



            }
            union() {

                translate([4.5,-15,-1]){
                    cube([3,15,5], center=false);
                }      
                translate([4.5,19,-1]){
                    cube([3,15,5], center=false);
                }      


                translate([6,50,30]){
                    rotate([90,0,0]){
                        cylinder(h=100, r=1.2, $fn=100, center=false);
                    }
                }  


            }
        }
